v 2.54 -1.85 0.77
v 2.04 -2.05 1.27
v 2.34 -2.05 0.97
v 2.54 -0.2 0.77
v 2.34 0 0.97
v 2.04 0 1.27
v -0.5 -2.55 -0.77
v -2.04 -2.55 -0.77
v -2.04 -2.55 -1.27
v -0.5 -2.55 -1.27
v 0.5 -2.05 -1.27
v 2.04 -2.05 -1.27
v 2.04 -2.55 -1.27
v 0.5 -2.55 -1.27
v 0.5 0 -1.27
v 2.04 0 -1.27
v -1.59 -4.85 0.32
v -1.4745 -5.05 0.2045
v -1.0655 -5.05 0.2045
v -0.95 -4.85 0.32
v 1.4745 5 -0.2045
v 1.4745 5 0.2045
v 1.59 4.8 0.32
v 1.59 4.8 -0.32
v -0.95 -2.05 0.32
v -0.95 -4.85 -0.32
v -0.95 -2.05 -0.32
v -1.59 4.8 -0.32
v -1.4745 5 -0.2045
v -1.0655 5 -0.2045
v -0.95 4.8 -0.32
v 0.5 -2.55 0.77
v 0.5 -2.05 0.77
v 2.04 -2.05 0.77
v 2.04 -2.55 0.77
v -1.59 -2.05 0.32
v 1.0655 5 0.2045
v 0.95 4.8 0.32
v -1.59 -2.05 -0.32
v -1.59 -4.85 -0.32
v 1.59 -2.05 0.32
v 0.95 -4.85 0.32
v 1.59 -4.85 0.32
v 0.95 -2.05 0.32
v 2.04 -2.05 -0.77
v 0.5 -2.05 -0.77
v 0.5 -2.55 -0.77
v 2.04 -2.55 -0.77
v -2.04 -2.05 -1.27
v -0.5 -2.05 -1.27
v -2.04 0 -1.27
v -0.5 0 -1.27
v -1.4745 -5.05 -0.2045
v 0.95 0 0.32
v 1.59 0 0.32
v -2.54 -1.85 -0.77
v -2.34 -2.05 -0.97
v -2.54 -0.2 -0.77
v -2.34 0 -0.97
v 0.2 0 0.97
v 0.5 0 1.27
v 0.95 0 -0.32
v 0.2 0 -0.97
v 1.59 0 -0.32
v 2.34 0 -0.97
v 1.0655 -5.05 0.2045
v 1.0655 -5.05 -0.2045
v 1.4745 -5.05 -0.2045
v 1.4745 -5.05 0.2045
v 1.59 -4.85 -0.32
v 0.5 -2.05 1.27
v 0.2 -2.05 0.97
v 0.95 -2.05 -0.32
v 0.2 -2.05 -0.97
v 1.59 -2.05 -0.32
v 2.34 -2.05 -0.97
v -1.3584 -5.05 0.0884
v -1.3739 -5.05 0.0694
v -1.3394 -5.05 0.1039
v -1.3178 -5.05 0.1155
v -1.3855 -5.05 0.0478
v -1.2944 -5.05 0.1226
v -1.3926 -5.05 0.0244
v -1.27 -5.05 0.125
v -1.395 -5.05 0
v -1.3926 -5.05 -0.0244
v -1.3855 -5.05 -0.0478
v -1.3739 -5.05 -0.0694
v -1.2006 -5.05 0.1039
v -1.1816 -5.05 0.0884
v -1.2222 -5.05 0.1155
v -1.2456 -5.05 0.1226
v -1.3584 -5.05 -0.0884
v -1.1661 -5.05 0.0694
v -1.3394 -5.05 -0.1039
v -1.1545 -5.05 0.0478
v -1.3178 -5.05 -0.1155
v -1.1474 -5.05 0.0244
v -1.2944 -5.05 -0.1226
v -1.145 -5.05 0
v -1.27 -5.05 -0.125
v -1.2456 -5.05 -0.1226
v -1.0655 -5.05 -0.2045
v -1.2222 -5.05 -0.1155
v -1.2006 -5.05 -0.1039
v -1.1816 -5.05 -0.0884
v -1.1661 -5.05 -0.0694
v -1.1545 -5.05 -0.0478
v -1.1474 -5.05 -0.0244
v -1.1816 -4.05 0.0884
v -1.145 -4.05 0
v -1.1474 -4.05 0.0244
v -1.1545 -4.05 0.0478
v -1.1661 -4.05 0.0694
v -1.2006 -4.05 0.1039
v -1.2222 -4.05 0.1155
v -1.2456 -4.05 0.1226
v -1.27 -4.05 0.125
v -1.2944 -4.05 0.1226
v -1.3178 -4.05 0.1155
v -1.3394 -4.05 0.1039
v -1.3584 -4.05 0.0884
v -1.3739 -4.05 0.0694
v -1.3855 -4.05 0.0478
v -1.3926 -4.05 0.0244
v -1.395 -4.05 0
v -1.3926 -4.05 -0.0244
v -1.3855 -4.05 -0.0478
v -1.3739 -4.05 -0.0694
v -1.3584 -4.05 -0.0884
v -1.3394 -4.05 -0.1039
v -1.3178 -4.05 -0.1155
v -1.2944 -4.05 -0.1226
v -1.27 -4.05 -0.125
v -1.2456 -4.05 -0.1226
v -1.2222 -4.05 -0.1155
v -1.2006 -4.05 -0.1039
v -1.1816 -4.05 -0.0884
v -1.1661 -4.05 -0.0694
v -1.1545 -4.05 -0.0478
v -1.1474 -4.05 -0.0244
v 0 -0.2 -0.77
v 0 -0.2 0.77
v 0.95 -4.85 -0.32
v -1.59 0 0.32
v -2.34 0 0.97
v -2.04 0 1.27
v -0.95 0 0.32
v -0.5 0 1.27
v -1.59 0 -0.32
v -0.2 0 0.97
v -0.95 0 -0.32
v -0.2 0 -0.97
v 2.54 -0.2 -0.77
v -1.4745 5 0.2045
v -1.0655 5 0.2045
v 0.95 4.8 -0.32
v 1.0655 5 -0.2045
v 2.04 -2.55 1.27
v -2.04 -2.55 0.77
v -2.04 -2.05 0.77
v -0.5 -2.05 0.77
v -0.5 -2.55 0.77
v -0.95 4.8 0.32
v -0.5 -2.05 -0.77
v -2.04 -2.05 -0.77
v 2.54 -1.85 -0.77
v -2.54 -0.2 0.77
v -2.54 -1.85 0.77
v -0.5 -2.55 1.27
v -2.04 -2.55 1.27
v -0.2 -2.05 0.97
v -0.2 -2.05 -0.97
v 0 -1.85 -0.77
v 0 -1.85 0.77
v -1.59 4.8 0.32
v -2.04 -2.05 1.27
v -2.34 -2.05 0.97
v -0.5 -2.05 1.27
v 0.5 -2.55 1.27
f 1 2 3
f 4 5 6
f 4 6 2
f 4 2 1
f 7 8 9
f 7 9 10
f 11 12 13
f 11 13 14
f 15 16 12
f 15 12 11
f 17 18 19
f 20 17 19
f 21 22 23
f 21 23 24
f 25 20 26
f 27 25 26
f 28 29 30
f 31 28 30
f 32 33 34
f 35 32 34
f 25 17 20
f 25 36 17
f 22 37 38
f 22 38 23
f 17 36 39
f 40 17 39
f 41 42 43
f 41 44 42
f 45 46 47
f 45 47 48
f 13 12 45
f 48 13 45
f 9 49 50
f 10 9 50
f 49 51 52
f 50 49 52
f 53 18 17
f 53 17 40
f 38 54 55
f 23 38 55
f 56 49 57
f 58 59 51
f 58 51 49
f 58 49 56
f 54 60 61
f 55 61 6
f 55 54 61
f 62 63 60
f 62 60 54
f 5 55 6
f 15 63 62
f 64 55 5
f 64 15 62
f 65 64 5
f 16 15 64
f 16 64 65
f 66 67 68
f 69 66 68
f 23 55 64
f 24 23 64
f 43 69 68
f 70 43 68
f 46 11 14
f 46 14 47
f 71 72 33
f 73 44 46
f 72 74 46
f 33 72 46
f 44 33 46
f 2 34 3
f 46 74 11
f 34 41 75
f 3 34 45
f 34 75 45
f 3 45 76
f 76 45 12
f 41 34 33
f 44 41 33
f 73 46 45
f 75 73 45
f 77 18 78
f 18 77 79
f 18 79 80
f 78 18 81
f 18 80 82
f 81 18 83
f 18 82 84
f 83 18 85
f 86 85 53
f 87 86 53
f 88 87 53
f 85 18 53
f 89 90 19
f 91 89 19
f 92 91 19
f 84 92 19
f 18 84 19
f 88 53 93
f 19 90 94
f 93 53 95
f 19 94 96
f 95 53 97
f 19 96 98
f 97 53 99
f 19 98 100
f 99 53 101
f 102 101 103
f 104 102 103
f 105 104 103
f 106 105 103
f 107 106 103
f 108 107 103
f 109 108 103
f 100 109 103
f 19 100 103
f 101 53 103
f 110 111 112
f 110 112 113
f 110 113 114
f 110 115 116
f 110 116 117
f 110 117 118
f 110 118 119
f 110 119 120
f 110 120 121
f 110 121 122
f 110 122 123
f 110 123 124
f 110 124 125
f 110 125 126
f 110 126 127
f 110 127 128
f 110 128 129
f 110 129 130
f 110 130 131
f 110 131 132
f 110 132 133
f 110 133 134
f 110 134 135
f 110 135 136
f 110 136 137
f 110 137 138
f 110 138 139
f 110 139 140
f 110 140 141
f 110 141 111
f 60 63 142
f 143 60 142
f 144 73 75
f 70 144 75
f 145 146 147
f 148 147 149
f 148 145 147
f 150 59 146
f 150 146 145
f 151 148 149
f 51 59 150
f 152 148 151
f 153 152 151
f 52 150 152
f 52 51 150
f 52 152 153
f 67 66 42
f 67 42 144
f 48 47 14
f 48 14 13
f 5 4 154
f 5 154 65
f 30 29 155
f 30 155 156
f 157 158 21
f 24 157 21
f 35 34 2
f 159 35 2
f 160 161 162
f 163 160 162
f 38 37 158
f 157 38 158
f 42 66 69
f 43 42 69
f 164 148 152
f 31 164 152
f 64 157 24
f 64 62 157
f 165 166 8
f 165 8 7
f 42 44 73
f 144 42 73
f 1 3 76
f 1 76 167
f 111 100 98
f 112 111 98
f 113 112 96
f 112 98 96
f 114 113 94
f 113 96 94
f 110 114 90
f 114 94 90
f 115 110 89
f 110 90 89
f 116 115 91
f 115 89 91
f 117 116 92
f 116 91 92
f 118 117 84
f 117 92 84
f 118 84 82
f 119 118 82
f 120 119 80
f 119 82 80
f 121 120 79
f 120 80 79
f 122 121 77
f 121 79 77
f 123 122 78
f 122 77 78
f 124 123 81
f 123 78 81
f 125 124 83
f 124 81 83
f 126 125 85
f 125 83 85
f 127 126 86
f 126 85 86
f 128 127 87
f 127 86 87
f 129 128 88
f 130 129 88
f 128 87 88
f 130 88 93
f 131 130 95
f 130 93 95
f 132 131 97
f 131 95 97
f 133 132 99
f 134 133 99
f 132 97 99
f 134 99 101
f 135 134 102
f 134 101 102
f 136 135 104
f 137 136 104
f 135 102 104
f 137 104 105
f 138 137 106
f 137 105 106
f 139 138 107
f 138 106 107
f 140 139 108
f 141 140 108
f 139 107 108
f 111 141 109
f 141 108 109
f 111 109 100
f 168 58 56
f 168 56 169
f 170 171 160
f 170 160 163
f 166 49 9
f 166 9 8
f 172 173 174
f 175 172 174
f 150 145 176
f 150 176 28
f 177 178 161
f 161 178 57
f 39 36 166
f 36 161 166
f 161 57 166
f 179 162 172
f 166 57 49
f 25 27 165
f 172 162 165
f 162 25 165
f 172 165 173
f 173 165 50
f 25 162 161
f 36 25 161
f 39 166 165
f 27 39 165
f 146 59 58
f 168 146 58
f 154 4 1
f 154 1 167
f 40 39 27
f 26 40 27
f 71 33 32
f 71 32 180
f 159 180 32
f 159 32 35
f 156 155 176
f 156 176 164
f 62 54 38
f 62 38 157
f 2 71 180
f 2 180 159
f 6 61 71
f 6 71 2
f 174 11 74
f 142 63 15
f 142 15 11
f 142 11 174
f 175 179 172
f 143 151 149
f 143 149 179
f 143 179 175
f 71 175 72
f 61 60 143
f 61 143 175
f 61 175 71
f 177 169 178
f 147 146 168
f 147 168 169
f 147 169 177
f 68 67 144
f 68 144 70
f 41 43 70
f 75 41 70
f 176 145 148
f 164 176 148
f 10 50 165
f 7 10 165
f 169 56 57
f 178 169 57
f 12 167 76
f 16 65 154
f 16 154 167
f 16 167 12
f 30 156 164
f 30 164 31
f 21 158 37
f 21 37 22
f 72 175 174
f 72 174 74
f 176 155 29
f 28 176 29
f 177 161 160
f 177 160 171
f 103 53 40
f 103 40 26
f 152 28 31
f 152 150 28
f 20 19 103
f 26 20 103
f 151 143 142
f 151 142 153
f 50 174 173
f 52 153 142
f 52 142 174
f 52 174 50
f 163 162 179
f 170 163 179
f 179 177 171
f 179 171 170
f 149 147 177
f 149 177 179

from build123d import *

# Parameters (mm, degrees)
SKETCH1_W                = 0.64
SKETCH1_H                = 0.64
BOSS_EXTRUDE1_DEPTH      = 2.05
CUT_EXTRUDE1_DEPTH       = 5
SKETCH3_W                = 1.54
SKETCH3_H                = 0.5
BOSS_EXTRUDE2_DEPTH      = 0.5
SKETCH4_W                = 0.64
SKETCH4_H                = 0.64
BOSS_EXTRUDE3_DEPTH      = 5
BOSS_EXTRUDE3_DEPTH_BACK = 5.05
CHAMFER1_SIZE            = 0.2
CHAMFER1_SIZE2           = 0.115470054
CHAMFER1_PART_2_SIZE     = 0.2
CHAMFER1_PART_2_SIZE2    = 0.115470054
CHAMFER1_PART_3_SIZE     = 0.2
CHAMFER1_PART_3_SIZE2    = 0.115470054
CHAMFER1_PART_4_SIZE     = 0.2
CHAMFER1_PART_4_SIZE2    = 0.115470054
CHAMFER1_PART_5_SIZE     = 0.2
CHAMFER1_PART_5_SIZE2    = 0.115470054
CHAMFER1_PART_6_SIZE     = 0.2
CHAMFER1_PART_6_SIZE2    = 0.115470054
CHAMFER1_PART_7_SIZE     = 0.2
CHAMFER1_PART_7_SIZE2    = 0.115470054
CHAMFER1_PART_8_SIZE     = 0.2
CHAMFER1_PART_8_SIZE2    = 0.115470054
CHAMFER1_PART_9_SIZE     = 0.2
CHAMFER1_PART_9_SIZE2    = 0.115470054
CHAMFER1_PART_10_SIZE    = 0.2
CHAMFER1_PART_10_SIZE2   = 0.115470054
CHAMFER1_PART_11_SIZE    = 0.2
CHAMFER1_PART_11_SIZE2   = 0.115470054
CHAMFER1_PART_12_SIZE    = 0.2
CHAMFER1_PART_12_SIZE2   = 0.115470054
CHAMFER1_PART_13_SIZE    = 0.2
CHAMFER1_PART_13_SIZE2   = 0.115470054
CHAMFER1_PART_14_SIZE    = 0.2
CHAMFER1_PART_14_SIZE2   = 0.115470054
CHAMFER1_PART_15_SIZE    = 0.2
CHAMFER1_PART_15_SIZE2   = 0.115470054
CHAMFER1_PART_16_SIZE    = 0.2
CHAMFER1_PART_16_SIZE2   = 0.115470054
SKETCH5_R                = 0.125
CUT_EXTRUDE2_DEPTH       = 1


with BuildPart() as part:
    # Sketch1 → Boss-Extrude1 (new body)
    with BuildSketch(Plane(origin=(0, 0, 0), x_dir=(1, 0, 0), z_dir=(0, 1, 0))):
        Polygon((-2.04, -1.27), (-0.5, -1.27), (0, -0.77), (0.5, -1.27), (2.04, -1.27), (2.54, -0.77), (2.54, 0.77), (2.04, 1.27), (0.5, 1.27), (0, 0.77), (-0.5, 1.27), (-2.04, 1.27), (-2.54, 0.77), (-2.54, -0.77), align=None)
        with Locations((1.27, 0)):
            Rectangle(SKETCH1_W, SKETCH1_H, mode=Mode.SUBTRACT)
        with Locations((-1.27, 0)):
            Rectangle(SKETCH1_W, SKETCH1_H, mode=Mode.SUBTRACT)
    extrude(amount=-BOSS_EXTRUDE1_DEPTH)

    # Sketch2 → Cut-Extrude1 (cut, symmetric)
    with BuildSketch(Plane.XY):
        Polygon((-2.54, -0.2), (-2.54, 0), (-2.34, 0), align=None)
        Polygon((-0.2, 0), (0.2, 0), (0, -0.2), align=None)
        Polygon((2.34, 0), (2.54, 0), (2.54, -0.2), align=None)
        Polygon((-2.54, -1.85), (-2.34, -2.05), (-2.54, -2.05), align=None)
        Polygon((-0.2, -2.05), (0, -1.85), (0.2, -2.05), align=None)
        Polygon((2.34, -2.05), (2.54, -1.85), (2.54, -2.05), align=None)
    extrude(amount=CUT_EXTRUDE1_DEPTH, both=True, mode=Mode.SUBTRACT)

    # Sketch3 → Boss-Extrude2 (add)
    with BuildSketch(Plane.XZ.offset(2.05)):
        with Locations((-1.27, -1.02)):
            Rectangle(SKETCH3_W, SKETCH3_H)
        with Locations((-1.27, 1.02)):
            Rectangle(SKETCH3_W, SKETCH3_H)
        with Locations((1.27, 1.02)):
            Rectangle(SKETCH3_W, SKETCH3_H)
        with Locations((1.27, -1.02)):
            Rectangle(SKETCH3_W, SKETCH3_H)
    extrude(amount=BOSS_EXTRUDE2_DEPTH)

    # Sketch4 → Boss-Extrude3 (add, two sides)
    with BuildSketch(Plane(origin=(0, 0, 0), x_dir=(1, 0, 0), z_dir=(0, 1, 0))) as boss_extrude3_sk:
        with Locations((-1.27, 0)):
            Rectangle(SKETCH4_W, SKETCH4_H)
        with Locations((1.27, 0)):
            Rectangle(SKETCH4_W, SKETCH4_H)
    extrude(amount=BOSS_EXTRUDE3_DEPTH)
    extrude(boss_extrude3_sk.sketch, amount=-BOSS_EXTRUDE3_DEPTH_BACK)

    # Chamfer1
    chamfer1_edges = [part.edges().sort_by_distance(p)[0] for p in [
        (-1.59, -5.05, 0),
    ]]
    chamfer1_side = [part.faces().sort_by_distance(p)[0] for p in [
        (-1.59, -3.55, 0),
    ]]
    chamfer(chamfer1_edges, length=CHAMFER1_SIZE, length2=CHAMFER1_SIZE2, reference=chamfer1_side[0])

    # Chamfer1 part 2
    chamfer1_part_2_edges = [part.edges().sort_by_distance(p)[0] for p in [
        (-1.27, -5.05, -0.32),
    ]]
    chamfer1_part_2_side = [part.faces().sort_by_distance(p)[0] for p in [
        (-1.27, -3.55, -0.32),
    ]]
    chamfer(chamfer1_part_2_edges, length=CHAMFER1_PART_2_SIZE, length2=CHAMFER1_PART_2_SIZE2, reference=chamfer1_part_2_side[0])

    # Chamfer1 part 3
    chamfer1_part_3_edges = [part.edges().sort_by_distance(p)[0] for p in [
        (-0.95, -5.05, 0),
    ]]
    chamfer1_part_3_side = [part.faces().sort_by_distance(p)[0] for p in [
        (-0.95, -3.55, 0),
    ]]
    chamfer(chamfer1_part_3_edges, length=CHAMFER1_PART_3_SIZE, length2=CHAMFER1_PART_3_SIZE2, reference=chamfer1_part_3_side[0])

    # Chamfer1 part 4
    chamfer1_part_4_edges = [part.edges().sort_by_distance(p)[0] for p in [
        (-1.27, -5.05, 0.32),
    ]]
    chamfer1_part_4_side = [part.faces().sort_by_distance(p)[0] for p in [
        (-1.27, -3.55, 0.32),
    ]]
    chamfer(chamfer1_part_4_edges, length=CHAMFER1_PART_4_SIZE, length2=CHAMFER1_PART_4_SIZE2, reference=chamfer1_part_4_side[0])

    # Chamfer1 part 5
    chamfer1_part_5_edges = [part.edges().sort_by_distance(p)[0] for p in [
        (-1.59, 5, 0),
    ]]
    chamfer1_part_5_side = [part.faces().sort_by_distance(p)[0] for p in [
        (-1.59, 2.5, 0),
    ]]
    chamfer(chamfer1_part_5_edges, length=CHAMFER1_PART_5_SIZE, length2=CHAMFER1_PART_5_SIZE2, reference=chamfer1_part_5_side[0])

    # Chamfer1 part 6
    chamfer1_part_6_edges = [part.edges().sort_by_distance(p)[0] for p in [
        (-1.27, 5, 0.32),
    ]]
    chamfer1_part_6_side = [part.faces().sort_by_distance(p)[0] for p in [
        (-1.27, 2.5, 0.32),
    ]]
    chamfer(chamfer1_part_6_edges, length=CHAMFER1_PART_6_SIZE, length2=CHAMFER1_PART_6_SIZE2, reference=chamfer1_part_6_side[0])

    # Chamfer1 part 7
    chamfer1_part_7_edges = [part.edges().sort_by_distance(p)[0] for p in [
        (-0.95, 5, 0),
    ]]
    chamfer1_part_7_side = [part.faces().sort_by_distance(p)[0] for p in [
        (-0.95, 2.5, 0),
    ]]
    chamfer(chamfer1_part_7_edges, length=CHAMFER1_PART_7_SIZE, length2=CHAMFER1_PART_7_SIZE2, reference=chamfer1_part_7_side[0])

    # Chamfer1 part 8
    chamfer1_part_8_edges = [part.edges().sort_by_distance(p)[0] for p in [
        (-1.27, 5, -0.32),
    ]]
    chamfer1_part_8_side = [part.faces().sort_by_distance(p)[0] for p in [
        (-1.27, 2.5, -0.32),
    ]]
    chamfer(chamfer1_part_8_edges, length=CHAMFER1_PART_8_SIZE, length2=CHAMFER1_PART_8_SIZE2, reference=chamfer1_part_8_side[0])

    # Chamfer1 part 9
    chamfer1_part_9_edges = [part.edges().sort_by_distance(p)[0] for p in [
        (0.95, -5.05, 0),
    ]]
    chamfer1_part_9_side = [part.faces().sort_by_distance(p)[0] for p in [
        (0.95, -3.55, 0),
    ]]
    chamfer(chamfer1_part_9_edges, length=CHAMFER1_PART_9_SIZE, length2=CHAMFER1_PART_9_SIZE2, reference=chamfer1_part_9_side[0])

    # Chamfer1 part 10
    chamfer1_part_10_edges = [part.edges().sort_by_distance(p)[0] for p in [
        (1.27, -5.05, -0.32),
    ]]
    chamfer1_part_10_side = [part.faces().sort_by_distance(p)[0] for p in [
        (1.27, -3.55, -0.32),
    ]]
    chamfer(chamfer1_part_10_edges, length=CHAMFER1_PART_10_SIZE, length2=CHAMFER1_PART_10_SIZE2, reference=chamfer1_part_10_side[0])

    # Chamfer1 part 11
    chamfer1_part_11_edges = [part.edges().sort_by_distance(p)[0] for p in [
        (1.59, -5.05, 0),
    ]]
    chamfer1_part_11_side = [part.faces().sort_by_distance(p)[0] for p in [
        (1.59, -3.55, 0),
    ]]
    chamfer(chamfer1_part_11_edges, length=CHAMFER1_PART_11_SIZE, length2=CHAMFER1_PART_11_SIZE2, reference=chamfer1_part_11_side[0])

    # Chamfer1 part 12
    chamfer1_part_12_edges = [part.edges().sort_by_distance(p)[0] for p in [
        (1.27, -5.05, 0.32),
    ]]
    chamfer1_part_12_side = [part.faces().sort_by_distance(p)[0] for p in [
        (1.27, -3.55, 0.32),
    ]]
    chamfer(chamfer1_part_12_edges, length=CHAMFER1_PART_12_SIZE, length2=CHAMFER1_PART_12_SIZE2, reference=chamfer1_part_12_side[0])

    # Chamfer1 part 13
    chamfer1_part_13_edges = [part.edges().sort_by_distance(p)[0] for p in [
        (0.95, 5, 0),
    ]]
    chamfer1_part_13_side = [part.faces().sort_by_distance(p)[0] for p in [
        (0.95, 2.5, 0),
    ]]
    chamfer(chamfer1_part_13_edges, length=CHAMFER1_PART_13_SIZE, length2=CHAMFER1_PART_13_SIZE2, reference=chamfer1_part_13_side[0])

    # Chamfer1 part 14
    chamfer1_part_14_edges = [part.edges().sort_by_distance(p)[0] for p in [
        (1.27, 5, 0.32),
    ]]
    chamfer1_part_14_side = [part.faces().sort_by_distance(p)[0] for p in [
        (1.27, 2.5, 0.32),
    ]]
    chamfer(chamfer1_part_14_edges, length=CHAMFER1_PART_14_SIZE, length2=CHAMFER1_PART_14_SIZE2, reference=chamfer1_part_14_side[0])

    # Chamfer1 part 15
    chamfer1_part_15_edges = [part.edges().sort_by_distance(p)[0] for p in [
        (1.59, 5, 0),
    ]]
    chamfer1_part_15_side = [part.faces().sort_by_distance(p)[0] for p in [
        (1.59, 2.5, 0),
    ]]
    chamfer(chamfer1_part_15_edges, length=CHAMFER1_PART_15_SIZE, length2=CHAMFER1_PART_15_SIZE2, reference=chamfer1_part_15_side[0])

    # Chamfer1 part 16
    chamfer1_part_16_edges = [part.edges().sort_by_distance(p)[0] for p in [
        (1.27, 5, -0.32),
    ]]
    chamfer1_part_16_side = [part.faces().sort_by_distance(p)[0] for p in [
        (1.27, 2.5, -0.32),
    ]]
    chamfer(chamfer1_part_16_edges, length=CHAMFER1_PART_16_SIZE, length2=CHAMFER1_PART_16_SIZE2, reference=chamfer1_part_16_side[0])

    # Sketch5 → Cut-Extrude2 (cut)
    with BuildSketch(Plane.XZ.offset(5.05)):
        with Locations((-1.27, 0)):
            Circle(SKETCH5_R)
    extrude(amount=-CUT_EXTRUDE2_DEPTH, mode=Mode.SUBTRACT)


solid = part.part
